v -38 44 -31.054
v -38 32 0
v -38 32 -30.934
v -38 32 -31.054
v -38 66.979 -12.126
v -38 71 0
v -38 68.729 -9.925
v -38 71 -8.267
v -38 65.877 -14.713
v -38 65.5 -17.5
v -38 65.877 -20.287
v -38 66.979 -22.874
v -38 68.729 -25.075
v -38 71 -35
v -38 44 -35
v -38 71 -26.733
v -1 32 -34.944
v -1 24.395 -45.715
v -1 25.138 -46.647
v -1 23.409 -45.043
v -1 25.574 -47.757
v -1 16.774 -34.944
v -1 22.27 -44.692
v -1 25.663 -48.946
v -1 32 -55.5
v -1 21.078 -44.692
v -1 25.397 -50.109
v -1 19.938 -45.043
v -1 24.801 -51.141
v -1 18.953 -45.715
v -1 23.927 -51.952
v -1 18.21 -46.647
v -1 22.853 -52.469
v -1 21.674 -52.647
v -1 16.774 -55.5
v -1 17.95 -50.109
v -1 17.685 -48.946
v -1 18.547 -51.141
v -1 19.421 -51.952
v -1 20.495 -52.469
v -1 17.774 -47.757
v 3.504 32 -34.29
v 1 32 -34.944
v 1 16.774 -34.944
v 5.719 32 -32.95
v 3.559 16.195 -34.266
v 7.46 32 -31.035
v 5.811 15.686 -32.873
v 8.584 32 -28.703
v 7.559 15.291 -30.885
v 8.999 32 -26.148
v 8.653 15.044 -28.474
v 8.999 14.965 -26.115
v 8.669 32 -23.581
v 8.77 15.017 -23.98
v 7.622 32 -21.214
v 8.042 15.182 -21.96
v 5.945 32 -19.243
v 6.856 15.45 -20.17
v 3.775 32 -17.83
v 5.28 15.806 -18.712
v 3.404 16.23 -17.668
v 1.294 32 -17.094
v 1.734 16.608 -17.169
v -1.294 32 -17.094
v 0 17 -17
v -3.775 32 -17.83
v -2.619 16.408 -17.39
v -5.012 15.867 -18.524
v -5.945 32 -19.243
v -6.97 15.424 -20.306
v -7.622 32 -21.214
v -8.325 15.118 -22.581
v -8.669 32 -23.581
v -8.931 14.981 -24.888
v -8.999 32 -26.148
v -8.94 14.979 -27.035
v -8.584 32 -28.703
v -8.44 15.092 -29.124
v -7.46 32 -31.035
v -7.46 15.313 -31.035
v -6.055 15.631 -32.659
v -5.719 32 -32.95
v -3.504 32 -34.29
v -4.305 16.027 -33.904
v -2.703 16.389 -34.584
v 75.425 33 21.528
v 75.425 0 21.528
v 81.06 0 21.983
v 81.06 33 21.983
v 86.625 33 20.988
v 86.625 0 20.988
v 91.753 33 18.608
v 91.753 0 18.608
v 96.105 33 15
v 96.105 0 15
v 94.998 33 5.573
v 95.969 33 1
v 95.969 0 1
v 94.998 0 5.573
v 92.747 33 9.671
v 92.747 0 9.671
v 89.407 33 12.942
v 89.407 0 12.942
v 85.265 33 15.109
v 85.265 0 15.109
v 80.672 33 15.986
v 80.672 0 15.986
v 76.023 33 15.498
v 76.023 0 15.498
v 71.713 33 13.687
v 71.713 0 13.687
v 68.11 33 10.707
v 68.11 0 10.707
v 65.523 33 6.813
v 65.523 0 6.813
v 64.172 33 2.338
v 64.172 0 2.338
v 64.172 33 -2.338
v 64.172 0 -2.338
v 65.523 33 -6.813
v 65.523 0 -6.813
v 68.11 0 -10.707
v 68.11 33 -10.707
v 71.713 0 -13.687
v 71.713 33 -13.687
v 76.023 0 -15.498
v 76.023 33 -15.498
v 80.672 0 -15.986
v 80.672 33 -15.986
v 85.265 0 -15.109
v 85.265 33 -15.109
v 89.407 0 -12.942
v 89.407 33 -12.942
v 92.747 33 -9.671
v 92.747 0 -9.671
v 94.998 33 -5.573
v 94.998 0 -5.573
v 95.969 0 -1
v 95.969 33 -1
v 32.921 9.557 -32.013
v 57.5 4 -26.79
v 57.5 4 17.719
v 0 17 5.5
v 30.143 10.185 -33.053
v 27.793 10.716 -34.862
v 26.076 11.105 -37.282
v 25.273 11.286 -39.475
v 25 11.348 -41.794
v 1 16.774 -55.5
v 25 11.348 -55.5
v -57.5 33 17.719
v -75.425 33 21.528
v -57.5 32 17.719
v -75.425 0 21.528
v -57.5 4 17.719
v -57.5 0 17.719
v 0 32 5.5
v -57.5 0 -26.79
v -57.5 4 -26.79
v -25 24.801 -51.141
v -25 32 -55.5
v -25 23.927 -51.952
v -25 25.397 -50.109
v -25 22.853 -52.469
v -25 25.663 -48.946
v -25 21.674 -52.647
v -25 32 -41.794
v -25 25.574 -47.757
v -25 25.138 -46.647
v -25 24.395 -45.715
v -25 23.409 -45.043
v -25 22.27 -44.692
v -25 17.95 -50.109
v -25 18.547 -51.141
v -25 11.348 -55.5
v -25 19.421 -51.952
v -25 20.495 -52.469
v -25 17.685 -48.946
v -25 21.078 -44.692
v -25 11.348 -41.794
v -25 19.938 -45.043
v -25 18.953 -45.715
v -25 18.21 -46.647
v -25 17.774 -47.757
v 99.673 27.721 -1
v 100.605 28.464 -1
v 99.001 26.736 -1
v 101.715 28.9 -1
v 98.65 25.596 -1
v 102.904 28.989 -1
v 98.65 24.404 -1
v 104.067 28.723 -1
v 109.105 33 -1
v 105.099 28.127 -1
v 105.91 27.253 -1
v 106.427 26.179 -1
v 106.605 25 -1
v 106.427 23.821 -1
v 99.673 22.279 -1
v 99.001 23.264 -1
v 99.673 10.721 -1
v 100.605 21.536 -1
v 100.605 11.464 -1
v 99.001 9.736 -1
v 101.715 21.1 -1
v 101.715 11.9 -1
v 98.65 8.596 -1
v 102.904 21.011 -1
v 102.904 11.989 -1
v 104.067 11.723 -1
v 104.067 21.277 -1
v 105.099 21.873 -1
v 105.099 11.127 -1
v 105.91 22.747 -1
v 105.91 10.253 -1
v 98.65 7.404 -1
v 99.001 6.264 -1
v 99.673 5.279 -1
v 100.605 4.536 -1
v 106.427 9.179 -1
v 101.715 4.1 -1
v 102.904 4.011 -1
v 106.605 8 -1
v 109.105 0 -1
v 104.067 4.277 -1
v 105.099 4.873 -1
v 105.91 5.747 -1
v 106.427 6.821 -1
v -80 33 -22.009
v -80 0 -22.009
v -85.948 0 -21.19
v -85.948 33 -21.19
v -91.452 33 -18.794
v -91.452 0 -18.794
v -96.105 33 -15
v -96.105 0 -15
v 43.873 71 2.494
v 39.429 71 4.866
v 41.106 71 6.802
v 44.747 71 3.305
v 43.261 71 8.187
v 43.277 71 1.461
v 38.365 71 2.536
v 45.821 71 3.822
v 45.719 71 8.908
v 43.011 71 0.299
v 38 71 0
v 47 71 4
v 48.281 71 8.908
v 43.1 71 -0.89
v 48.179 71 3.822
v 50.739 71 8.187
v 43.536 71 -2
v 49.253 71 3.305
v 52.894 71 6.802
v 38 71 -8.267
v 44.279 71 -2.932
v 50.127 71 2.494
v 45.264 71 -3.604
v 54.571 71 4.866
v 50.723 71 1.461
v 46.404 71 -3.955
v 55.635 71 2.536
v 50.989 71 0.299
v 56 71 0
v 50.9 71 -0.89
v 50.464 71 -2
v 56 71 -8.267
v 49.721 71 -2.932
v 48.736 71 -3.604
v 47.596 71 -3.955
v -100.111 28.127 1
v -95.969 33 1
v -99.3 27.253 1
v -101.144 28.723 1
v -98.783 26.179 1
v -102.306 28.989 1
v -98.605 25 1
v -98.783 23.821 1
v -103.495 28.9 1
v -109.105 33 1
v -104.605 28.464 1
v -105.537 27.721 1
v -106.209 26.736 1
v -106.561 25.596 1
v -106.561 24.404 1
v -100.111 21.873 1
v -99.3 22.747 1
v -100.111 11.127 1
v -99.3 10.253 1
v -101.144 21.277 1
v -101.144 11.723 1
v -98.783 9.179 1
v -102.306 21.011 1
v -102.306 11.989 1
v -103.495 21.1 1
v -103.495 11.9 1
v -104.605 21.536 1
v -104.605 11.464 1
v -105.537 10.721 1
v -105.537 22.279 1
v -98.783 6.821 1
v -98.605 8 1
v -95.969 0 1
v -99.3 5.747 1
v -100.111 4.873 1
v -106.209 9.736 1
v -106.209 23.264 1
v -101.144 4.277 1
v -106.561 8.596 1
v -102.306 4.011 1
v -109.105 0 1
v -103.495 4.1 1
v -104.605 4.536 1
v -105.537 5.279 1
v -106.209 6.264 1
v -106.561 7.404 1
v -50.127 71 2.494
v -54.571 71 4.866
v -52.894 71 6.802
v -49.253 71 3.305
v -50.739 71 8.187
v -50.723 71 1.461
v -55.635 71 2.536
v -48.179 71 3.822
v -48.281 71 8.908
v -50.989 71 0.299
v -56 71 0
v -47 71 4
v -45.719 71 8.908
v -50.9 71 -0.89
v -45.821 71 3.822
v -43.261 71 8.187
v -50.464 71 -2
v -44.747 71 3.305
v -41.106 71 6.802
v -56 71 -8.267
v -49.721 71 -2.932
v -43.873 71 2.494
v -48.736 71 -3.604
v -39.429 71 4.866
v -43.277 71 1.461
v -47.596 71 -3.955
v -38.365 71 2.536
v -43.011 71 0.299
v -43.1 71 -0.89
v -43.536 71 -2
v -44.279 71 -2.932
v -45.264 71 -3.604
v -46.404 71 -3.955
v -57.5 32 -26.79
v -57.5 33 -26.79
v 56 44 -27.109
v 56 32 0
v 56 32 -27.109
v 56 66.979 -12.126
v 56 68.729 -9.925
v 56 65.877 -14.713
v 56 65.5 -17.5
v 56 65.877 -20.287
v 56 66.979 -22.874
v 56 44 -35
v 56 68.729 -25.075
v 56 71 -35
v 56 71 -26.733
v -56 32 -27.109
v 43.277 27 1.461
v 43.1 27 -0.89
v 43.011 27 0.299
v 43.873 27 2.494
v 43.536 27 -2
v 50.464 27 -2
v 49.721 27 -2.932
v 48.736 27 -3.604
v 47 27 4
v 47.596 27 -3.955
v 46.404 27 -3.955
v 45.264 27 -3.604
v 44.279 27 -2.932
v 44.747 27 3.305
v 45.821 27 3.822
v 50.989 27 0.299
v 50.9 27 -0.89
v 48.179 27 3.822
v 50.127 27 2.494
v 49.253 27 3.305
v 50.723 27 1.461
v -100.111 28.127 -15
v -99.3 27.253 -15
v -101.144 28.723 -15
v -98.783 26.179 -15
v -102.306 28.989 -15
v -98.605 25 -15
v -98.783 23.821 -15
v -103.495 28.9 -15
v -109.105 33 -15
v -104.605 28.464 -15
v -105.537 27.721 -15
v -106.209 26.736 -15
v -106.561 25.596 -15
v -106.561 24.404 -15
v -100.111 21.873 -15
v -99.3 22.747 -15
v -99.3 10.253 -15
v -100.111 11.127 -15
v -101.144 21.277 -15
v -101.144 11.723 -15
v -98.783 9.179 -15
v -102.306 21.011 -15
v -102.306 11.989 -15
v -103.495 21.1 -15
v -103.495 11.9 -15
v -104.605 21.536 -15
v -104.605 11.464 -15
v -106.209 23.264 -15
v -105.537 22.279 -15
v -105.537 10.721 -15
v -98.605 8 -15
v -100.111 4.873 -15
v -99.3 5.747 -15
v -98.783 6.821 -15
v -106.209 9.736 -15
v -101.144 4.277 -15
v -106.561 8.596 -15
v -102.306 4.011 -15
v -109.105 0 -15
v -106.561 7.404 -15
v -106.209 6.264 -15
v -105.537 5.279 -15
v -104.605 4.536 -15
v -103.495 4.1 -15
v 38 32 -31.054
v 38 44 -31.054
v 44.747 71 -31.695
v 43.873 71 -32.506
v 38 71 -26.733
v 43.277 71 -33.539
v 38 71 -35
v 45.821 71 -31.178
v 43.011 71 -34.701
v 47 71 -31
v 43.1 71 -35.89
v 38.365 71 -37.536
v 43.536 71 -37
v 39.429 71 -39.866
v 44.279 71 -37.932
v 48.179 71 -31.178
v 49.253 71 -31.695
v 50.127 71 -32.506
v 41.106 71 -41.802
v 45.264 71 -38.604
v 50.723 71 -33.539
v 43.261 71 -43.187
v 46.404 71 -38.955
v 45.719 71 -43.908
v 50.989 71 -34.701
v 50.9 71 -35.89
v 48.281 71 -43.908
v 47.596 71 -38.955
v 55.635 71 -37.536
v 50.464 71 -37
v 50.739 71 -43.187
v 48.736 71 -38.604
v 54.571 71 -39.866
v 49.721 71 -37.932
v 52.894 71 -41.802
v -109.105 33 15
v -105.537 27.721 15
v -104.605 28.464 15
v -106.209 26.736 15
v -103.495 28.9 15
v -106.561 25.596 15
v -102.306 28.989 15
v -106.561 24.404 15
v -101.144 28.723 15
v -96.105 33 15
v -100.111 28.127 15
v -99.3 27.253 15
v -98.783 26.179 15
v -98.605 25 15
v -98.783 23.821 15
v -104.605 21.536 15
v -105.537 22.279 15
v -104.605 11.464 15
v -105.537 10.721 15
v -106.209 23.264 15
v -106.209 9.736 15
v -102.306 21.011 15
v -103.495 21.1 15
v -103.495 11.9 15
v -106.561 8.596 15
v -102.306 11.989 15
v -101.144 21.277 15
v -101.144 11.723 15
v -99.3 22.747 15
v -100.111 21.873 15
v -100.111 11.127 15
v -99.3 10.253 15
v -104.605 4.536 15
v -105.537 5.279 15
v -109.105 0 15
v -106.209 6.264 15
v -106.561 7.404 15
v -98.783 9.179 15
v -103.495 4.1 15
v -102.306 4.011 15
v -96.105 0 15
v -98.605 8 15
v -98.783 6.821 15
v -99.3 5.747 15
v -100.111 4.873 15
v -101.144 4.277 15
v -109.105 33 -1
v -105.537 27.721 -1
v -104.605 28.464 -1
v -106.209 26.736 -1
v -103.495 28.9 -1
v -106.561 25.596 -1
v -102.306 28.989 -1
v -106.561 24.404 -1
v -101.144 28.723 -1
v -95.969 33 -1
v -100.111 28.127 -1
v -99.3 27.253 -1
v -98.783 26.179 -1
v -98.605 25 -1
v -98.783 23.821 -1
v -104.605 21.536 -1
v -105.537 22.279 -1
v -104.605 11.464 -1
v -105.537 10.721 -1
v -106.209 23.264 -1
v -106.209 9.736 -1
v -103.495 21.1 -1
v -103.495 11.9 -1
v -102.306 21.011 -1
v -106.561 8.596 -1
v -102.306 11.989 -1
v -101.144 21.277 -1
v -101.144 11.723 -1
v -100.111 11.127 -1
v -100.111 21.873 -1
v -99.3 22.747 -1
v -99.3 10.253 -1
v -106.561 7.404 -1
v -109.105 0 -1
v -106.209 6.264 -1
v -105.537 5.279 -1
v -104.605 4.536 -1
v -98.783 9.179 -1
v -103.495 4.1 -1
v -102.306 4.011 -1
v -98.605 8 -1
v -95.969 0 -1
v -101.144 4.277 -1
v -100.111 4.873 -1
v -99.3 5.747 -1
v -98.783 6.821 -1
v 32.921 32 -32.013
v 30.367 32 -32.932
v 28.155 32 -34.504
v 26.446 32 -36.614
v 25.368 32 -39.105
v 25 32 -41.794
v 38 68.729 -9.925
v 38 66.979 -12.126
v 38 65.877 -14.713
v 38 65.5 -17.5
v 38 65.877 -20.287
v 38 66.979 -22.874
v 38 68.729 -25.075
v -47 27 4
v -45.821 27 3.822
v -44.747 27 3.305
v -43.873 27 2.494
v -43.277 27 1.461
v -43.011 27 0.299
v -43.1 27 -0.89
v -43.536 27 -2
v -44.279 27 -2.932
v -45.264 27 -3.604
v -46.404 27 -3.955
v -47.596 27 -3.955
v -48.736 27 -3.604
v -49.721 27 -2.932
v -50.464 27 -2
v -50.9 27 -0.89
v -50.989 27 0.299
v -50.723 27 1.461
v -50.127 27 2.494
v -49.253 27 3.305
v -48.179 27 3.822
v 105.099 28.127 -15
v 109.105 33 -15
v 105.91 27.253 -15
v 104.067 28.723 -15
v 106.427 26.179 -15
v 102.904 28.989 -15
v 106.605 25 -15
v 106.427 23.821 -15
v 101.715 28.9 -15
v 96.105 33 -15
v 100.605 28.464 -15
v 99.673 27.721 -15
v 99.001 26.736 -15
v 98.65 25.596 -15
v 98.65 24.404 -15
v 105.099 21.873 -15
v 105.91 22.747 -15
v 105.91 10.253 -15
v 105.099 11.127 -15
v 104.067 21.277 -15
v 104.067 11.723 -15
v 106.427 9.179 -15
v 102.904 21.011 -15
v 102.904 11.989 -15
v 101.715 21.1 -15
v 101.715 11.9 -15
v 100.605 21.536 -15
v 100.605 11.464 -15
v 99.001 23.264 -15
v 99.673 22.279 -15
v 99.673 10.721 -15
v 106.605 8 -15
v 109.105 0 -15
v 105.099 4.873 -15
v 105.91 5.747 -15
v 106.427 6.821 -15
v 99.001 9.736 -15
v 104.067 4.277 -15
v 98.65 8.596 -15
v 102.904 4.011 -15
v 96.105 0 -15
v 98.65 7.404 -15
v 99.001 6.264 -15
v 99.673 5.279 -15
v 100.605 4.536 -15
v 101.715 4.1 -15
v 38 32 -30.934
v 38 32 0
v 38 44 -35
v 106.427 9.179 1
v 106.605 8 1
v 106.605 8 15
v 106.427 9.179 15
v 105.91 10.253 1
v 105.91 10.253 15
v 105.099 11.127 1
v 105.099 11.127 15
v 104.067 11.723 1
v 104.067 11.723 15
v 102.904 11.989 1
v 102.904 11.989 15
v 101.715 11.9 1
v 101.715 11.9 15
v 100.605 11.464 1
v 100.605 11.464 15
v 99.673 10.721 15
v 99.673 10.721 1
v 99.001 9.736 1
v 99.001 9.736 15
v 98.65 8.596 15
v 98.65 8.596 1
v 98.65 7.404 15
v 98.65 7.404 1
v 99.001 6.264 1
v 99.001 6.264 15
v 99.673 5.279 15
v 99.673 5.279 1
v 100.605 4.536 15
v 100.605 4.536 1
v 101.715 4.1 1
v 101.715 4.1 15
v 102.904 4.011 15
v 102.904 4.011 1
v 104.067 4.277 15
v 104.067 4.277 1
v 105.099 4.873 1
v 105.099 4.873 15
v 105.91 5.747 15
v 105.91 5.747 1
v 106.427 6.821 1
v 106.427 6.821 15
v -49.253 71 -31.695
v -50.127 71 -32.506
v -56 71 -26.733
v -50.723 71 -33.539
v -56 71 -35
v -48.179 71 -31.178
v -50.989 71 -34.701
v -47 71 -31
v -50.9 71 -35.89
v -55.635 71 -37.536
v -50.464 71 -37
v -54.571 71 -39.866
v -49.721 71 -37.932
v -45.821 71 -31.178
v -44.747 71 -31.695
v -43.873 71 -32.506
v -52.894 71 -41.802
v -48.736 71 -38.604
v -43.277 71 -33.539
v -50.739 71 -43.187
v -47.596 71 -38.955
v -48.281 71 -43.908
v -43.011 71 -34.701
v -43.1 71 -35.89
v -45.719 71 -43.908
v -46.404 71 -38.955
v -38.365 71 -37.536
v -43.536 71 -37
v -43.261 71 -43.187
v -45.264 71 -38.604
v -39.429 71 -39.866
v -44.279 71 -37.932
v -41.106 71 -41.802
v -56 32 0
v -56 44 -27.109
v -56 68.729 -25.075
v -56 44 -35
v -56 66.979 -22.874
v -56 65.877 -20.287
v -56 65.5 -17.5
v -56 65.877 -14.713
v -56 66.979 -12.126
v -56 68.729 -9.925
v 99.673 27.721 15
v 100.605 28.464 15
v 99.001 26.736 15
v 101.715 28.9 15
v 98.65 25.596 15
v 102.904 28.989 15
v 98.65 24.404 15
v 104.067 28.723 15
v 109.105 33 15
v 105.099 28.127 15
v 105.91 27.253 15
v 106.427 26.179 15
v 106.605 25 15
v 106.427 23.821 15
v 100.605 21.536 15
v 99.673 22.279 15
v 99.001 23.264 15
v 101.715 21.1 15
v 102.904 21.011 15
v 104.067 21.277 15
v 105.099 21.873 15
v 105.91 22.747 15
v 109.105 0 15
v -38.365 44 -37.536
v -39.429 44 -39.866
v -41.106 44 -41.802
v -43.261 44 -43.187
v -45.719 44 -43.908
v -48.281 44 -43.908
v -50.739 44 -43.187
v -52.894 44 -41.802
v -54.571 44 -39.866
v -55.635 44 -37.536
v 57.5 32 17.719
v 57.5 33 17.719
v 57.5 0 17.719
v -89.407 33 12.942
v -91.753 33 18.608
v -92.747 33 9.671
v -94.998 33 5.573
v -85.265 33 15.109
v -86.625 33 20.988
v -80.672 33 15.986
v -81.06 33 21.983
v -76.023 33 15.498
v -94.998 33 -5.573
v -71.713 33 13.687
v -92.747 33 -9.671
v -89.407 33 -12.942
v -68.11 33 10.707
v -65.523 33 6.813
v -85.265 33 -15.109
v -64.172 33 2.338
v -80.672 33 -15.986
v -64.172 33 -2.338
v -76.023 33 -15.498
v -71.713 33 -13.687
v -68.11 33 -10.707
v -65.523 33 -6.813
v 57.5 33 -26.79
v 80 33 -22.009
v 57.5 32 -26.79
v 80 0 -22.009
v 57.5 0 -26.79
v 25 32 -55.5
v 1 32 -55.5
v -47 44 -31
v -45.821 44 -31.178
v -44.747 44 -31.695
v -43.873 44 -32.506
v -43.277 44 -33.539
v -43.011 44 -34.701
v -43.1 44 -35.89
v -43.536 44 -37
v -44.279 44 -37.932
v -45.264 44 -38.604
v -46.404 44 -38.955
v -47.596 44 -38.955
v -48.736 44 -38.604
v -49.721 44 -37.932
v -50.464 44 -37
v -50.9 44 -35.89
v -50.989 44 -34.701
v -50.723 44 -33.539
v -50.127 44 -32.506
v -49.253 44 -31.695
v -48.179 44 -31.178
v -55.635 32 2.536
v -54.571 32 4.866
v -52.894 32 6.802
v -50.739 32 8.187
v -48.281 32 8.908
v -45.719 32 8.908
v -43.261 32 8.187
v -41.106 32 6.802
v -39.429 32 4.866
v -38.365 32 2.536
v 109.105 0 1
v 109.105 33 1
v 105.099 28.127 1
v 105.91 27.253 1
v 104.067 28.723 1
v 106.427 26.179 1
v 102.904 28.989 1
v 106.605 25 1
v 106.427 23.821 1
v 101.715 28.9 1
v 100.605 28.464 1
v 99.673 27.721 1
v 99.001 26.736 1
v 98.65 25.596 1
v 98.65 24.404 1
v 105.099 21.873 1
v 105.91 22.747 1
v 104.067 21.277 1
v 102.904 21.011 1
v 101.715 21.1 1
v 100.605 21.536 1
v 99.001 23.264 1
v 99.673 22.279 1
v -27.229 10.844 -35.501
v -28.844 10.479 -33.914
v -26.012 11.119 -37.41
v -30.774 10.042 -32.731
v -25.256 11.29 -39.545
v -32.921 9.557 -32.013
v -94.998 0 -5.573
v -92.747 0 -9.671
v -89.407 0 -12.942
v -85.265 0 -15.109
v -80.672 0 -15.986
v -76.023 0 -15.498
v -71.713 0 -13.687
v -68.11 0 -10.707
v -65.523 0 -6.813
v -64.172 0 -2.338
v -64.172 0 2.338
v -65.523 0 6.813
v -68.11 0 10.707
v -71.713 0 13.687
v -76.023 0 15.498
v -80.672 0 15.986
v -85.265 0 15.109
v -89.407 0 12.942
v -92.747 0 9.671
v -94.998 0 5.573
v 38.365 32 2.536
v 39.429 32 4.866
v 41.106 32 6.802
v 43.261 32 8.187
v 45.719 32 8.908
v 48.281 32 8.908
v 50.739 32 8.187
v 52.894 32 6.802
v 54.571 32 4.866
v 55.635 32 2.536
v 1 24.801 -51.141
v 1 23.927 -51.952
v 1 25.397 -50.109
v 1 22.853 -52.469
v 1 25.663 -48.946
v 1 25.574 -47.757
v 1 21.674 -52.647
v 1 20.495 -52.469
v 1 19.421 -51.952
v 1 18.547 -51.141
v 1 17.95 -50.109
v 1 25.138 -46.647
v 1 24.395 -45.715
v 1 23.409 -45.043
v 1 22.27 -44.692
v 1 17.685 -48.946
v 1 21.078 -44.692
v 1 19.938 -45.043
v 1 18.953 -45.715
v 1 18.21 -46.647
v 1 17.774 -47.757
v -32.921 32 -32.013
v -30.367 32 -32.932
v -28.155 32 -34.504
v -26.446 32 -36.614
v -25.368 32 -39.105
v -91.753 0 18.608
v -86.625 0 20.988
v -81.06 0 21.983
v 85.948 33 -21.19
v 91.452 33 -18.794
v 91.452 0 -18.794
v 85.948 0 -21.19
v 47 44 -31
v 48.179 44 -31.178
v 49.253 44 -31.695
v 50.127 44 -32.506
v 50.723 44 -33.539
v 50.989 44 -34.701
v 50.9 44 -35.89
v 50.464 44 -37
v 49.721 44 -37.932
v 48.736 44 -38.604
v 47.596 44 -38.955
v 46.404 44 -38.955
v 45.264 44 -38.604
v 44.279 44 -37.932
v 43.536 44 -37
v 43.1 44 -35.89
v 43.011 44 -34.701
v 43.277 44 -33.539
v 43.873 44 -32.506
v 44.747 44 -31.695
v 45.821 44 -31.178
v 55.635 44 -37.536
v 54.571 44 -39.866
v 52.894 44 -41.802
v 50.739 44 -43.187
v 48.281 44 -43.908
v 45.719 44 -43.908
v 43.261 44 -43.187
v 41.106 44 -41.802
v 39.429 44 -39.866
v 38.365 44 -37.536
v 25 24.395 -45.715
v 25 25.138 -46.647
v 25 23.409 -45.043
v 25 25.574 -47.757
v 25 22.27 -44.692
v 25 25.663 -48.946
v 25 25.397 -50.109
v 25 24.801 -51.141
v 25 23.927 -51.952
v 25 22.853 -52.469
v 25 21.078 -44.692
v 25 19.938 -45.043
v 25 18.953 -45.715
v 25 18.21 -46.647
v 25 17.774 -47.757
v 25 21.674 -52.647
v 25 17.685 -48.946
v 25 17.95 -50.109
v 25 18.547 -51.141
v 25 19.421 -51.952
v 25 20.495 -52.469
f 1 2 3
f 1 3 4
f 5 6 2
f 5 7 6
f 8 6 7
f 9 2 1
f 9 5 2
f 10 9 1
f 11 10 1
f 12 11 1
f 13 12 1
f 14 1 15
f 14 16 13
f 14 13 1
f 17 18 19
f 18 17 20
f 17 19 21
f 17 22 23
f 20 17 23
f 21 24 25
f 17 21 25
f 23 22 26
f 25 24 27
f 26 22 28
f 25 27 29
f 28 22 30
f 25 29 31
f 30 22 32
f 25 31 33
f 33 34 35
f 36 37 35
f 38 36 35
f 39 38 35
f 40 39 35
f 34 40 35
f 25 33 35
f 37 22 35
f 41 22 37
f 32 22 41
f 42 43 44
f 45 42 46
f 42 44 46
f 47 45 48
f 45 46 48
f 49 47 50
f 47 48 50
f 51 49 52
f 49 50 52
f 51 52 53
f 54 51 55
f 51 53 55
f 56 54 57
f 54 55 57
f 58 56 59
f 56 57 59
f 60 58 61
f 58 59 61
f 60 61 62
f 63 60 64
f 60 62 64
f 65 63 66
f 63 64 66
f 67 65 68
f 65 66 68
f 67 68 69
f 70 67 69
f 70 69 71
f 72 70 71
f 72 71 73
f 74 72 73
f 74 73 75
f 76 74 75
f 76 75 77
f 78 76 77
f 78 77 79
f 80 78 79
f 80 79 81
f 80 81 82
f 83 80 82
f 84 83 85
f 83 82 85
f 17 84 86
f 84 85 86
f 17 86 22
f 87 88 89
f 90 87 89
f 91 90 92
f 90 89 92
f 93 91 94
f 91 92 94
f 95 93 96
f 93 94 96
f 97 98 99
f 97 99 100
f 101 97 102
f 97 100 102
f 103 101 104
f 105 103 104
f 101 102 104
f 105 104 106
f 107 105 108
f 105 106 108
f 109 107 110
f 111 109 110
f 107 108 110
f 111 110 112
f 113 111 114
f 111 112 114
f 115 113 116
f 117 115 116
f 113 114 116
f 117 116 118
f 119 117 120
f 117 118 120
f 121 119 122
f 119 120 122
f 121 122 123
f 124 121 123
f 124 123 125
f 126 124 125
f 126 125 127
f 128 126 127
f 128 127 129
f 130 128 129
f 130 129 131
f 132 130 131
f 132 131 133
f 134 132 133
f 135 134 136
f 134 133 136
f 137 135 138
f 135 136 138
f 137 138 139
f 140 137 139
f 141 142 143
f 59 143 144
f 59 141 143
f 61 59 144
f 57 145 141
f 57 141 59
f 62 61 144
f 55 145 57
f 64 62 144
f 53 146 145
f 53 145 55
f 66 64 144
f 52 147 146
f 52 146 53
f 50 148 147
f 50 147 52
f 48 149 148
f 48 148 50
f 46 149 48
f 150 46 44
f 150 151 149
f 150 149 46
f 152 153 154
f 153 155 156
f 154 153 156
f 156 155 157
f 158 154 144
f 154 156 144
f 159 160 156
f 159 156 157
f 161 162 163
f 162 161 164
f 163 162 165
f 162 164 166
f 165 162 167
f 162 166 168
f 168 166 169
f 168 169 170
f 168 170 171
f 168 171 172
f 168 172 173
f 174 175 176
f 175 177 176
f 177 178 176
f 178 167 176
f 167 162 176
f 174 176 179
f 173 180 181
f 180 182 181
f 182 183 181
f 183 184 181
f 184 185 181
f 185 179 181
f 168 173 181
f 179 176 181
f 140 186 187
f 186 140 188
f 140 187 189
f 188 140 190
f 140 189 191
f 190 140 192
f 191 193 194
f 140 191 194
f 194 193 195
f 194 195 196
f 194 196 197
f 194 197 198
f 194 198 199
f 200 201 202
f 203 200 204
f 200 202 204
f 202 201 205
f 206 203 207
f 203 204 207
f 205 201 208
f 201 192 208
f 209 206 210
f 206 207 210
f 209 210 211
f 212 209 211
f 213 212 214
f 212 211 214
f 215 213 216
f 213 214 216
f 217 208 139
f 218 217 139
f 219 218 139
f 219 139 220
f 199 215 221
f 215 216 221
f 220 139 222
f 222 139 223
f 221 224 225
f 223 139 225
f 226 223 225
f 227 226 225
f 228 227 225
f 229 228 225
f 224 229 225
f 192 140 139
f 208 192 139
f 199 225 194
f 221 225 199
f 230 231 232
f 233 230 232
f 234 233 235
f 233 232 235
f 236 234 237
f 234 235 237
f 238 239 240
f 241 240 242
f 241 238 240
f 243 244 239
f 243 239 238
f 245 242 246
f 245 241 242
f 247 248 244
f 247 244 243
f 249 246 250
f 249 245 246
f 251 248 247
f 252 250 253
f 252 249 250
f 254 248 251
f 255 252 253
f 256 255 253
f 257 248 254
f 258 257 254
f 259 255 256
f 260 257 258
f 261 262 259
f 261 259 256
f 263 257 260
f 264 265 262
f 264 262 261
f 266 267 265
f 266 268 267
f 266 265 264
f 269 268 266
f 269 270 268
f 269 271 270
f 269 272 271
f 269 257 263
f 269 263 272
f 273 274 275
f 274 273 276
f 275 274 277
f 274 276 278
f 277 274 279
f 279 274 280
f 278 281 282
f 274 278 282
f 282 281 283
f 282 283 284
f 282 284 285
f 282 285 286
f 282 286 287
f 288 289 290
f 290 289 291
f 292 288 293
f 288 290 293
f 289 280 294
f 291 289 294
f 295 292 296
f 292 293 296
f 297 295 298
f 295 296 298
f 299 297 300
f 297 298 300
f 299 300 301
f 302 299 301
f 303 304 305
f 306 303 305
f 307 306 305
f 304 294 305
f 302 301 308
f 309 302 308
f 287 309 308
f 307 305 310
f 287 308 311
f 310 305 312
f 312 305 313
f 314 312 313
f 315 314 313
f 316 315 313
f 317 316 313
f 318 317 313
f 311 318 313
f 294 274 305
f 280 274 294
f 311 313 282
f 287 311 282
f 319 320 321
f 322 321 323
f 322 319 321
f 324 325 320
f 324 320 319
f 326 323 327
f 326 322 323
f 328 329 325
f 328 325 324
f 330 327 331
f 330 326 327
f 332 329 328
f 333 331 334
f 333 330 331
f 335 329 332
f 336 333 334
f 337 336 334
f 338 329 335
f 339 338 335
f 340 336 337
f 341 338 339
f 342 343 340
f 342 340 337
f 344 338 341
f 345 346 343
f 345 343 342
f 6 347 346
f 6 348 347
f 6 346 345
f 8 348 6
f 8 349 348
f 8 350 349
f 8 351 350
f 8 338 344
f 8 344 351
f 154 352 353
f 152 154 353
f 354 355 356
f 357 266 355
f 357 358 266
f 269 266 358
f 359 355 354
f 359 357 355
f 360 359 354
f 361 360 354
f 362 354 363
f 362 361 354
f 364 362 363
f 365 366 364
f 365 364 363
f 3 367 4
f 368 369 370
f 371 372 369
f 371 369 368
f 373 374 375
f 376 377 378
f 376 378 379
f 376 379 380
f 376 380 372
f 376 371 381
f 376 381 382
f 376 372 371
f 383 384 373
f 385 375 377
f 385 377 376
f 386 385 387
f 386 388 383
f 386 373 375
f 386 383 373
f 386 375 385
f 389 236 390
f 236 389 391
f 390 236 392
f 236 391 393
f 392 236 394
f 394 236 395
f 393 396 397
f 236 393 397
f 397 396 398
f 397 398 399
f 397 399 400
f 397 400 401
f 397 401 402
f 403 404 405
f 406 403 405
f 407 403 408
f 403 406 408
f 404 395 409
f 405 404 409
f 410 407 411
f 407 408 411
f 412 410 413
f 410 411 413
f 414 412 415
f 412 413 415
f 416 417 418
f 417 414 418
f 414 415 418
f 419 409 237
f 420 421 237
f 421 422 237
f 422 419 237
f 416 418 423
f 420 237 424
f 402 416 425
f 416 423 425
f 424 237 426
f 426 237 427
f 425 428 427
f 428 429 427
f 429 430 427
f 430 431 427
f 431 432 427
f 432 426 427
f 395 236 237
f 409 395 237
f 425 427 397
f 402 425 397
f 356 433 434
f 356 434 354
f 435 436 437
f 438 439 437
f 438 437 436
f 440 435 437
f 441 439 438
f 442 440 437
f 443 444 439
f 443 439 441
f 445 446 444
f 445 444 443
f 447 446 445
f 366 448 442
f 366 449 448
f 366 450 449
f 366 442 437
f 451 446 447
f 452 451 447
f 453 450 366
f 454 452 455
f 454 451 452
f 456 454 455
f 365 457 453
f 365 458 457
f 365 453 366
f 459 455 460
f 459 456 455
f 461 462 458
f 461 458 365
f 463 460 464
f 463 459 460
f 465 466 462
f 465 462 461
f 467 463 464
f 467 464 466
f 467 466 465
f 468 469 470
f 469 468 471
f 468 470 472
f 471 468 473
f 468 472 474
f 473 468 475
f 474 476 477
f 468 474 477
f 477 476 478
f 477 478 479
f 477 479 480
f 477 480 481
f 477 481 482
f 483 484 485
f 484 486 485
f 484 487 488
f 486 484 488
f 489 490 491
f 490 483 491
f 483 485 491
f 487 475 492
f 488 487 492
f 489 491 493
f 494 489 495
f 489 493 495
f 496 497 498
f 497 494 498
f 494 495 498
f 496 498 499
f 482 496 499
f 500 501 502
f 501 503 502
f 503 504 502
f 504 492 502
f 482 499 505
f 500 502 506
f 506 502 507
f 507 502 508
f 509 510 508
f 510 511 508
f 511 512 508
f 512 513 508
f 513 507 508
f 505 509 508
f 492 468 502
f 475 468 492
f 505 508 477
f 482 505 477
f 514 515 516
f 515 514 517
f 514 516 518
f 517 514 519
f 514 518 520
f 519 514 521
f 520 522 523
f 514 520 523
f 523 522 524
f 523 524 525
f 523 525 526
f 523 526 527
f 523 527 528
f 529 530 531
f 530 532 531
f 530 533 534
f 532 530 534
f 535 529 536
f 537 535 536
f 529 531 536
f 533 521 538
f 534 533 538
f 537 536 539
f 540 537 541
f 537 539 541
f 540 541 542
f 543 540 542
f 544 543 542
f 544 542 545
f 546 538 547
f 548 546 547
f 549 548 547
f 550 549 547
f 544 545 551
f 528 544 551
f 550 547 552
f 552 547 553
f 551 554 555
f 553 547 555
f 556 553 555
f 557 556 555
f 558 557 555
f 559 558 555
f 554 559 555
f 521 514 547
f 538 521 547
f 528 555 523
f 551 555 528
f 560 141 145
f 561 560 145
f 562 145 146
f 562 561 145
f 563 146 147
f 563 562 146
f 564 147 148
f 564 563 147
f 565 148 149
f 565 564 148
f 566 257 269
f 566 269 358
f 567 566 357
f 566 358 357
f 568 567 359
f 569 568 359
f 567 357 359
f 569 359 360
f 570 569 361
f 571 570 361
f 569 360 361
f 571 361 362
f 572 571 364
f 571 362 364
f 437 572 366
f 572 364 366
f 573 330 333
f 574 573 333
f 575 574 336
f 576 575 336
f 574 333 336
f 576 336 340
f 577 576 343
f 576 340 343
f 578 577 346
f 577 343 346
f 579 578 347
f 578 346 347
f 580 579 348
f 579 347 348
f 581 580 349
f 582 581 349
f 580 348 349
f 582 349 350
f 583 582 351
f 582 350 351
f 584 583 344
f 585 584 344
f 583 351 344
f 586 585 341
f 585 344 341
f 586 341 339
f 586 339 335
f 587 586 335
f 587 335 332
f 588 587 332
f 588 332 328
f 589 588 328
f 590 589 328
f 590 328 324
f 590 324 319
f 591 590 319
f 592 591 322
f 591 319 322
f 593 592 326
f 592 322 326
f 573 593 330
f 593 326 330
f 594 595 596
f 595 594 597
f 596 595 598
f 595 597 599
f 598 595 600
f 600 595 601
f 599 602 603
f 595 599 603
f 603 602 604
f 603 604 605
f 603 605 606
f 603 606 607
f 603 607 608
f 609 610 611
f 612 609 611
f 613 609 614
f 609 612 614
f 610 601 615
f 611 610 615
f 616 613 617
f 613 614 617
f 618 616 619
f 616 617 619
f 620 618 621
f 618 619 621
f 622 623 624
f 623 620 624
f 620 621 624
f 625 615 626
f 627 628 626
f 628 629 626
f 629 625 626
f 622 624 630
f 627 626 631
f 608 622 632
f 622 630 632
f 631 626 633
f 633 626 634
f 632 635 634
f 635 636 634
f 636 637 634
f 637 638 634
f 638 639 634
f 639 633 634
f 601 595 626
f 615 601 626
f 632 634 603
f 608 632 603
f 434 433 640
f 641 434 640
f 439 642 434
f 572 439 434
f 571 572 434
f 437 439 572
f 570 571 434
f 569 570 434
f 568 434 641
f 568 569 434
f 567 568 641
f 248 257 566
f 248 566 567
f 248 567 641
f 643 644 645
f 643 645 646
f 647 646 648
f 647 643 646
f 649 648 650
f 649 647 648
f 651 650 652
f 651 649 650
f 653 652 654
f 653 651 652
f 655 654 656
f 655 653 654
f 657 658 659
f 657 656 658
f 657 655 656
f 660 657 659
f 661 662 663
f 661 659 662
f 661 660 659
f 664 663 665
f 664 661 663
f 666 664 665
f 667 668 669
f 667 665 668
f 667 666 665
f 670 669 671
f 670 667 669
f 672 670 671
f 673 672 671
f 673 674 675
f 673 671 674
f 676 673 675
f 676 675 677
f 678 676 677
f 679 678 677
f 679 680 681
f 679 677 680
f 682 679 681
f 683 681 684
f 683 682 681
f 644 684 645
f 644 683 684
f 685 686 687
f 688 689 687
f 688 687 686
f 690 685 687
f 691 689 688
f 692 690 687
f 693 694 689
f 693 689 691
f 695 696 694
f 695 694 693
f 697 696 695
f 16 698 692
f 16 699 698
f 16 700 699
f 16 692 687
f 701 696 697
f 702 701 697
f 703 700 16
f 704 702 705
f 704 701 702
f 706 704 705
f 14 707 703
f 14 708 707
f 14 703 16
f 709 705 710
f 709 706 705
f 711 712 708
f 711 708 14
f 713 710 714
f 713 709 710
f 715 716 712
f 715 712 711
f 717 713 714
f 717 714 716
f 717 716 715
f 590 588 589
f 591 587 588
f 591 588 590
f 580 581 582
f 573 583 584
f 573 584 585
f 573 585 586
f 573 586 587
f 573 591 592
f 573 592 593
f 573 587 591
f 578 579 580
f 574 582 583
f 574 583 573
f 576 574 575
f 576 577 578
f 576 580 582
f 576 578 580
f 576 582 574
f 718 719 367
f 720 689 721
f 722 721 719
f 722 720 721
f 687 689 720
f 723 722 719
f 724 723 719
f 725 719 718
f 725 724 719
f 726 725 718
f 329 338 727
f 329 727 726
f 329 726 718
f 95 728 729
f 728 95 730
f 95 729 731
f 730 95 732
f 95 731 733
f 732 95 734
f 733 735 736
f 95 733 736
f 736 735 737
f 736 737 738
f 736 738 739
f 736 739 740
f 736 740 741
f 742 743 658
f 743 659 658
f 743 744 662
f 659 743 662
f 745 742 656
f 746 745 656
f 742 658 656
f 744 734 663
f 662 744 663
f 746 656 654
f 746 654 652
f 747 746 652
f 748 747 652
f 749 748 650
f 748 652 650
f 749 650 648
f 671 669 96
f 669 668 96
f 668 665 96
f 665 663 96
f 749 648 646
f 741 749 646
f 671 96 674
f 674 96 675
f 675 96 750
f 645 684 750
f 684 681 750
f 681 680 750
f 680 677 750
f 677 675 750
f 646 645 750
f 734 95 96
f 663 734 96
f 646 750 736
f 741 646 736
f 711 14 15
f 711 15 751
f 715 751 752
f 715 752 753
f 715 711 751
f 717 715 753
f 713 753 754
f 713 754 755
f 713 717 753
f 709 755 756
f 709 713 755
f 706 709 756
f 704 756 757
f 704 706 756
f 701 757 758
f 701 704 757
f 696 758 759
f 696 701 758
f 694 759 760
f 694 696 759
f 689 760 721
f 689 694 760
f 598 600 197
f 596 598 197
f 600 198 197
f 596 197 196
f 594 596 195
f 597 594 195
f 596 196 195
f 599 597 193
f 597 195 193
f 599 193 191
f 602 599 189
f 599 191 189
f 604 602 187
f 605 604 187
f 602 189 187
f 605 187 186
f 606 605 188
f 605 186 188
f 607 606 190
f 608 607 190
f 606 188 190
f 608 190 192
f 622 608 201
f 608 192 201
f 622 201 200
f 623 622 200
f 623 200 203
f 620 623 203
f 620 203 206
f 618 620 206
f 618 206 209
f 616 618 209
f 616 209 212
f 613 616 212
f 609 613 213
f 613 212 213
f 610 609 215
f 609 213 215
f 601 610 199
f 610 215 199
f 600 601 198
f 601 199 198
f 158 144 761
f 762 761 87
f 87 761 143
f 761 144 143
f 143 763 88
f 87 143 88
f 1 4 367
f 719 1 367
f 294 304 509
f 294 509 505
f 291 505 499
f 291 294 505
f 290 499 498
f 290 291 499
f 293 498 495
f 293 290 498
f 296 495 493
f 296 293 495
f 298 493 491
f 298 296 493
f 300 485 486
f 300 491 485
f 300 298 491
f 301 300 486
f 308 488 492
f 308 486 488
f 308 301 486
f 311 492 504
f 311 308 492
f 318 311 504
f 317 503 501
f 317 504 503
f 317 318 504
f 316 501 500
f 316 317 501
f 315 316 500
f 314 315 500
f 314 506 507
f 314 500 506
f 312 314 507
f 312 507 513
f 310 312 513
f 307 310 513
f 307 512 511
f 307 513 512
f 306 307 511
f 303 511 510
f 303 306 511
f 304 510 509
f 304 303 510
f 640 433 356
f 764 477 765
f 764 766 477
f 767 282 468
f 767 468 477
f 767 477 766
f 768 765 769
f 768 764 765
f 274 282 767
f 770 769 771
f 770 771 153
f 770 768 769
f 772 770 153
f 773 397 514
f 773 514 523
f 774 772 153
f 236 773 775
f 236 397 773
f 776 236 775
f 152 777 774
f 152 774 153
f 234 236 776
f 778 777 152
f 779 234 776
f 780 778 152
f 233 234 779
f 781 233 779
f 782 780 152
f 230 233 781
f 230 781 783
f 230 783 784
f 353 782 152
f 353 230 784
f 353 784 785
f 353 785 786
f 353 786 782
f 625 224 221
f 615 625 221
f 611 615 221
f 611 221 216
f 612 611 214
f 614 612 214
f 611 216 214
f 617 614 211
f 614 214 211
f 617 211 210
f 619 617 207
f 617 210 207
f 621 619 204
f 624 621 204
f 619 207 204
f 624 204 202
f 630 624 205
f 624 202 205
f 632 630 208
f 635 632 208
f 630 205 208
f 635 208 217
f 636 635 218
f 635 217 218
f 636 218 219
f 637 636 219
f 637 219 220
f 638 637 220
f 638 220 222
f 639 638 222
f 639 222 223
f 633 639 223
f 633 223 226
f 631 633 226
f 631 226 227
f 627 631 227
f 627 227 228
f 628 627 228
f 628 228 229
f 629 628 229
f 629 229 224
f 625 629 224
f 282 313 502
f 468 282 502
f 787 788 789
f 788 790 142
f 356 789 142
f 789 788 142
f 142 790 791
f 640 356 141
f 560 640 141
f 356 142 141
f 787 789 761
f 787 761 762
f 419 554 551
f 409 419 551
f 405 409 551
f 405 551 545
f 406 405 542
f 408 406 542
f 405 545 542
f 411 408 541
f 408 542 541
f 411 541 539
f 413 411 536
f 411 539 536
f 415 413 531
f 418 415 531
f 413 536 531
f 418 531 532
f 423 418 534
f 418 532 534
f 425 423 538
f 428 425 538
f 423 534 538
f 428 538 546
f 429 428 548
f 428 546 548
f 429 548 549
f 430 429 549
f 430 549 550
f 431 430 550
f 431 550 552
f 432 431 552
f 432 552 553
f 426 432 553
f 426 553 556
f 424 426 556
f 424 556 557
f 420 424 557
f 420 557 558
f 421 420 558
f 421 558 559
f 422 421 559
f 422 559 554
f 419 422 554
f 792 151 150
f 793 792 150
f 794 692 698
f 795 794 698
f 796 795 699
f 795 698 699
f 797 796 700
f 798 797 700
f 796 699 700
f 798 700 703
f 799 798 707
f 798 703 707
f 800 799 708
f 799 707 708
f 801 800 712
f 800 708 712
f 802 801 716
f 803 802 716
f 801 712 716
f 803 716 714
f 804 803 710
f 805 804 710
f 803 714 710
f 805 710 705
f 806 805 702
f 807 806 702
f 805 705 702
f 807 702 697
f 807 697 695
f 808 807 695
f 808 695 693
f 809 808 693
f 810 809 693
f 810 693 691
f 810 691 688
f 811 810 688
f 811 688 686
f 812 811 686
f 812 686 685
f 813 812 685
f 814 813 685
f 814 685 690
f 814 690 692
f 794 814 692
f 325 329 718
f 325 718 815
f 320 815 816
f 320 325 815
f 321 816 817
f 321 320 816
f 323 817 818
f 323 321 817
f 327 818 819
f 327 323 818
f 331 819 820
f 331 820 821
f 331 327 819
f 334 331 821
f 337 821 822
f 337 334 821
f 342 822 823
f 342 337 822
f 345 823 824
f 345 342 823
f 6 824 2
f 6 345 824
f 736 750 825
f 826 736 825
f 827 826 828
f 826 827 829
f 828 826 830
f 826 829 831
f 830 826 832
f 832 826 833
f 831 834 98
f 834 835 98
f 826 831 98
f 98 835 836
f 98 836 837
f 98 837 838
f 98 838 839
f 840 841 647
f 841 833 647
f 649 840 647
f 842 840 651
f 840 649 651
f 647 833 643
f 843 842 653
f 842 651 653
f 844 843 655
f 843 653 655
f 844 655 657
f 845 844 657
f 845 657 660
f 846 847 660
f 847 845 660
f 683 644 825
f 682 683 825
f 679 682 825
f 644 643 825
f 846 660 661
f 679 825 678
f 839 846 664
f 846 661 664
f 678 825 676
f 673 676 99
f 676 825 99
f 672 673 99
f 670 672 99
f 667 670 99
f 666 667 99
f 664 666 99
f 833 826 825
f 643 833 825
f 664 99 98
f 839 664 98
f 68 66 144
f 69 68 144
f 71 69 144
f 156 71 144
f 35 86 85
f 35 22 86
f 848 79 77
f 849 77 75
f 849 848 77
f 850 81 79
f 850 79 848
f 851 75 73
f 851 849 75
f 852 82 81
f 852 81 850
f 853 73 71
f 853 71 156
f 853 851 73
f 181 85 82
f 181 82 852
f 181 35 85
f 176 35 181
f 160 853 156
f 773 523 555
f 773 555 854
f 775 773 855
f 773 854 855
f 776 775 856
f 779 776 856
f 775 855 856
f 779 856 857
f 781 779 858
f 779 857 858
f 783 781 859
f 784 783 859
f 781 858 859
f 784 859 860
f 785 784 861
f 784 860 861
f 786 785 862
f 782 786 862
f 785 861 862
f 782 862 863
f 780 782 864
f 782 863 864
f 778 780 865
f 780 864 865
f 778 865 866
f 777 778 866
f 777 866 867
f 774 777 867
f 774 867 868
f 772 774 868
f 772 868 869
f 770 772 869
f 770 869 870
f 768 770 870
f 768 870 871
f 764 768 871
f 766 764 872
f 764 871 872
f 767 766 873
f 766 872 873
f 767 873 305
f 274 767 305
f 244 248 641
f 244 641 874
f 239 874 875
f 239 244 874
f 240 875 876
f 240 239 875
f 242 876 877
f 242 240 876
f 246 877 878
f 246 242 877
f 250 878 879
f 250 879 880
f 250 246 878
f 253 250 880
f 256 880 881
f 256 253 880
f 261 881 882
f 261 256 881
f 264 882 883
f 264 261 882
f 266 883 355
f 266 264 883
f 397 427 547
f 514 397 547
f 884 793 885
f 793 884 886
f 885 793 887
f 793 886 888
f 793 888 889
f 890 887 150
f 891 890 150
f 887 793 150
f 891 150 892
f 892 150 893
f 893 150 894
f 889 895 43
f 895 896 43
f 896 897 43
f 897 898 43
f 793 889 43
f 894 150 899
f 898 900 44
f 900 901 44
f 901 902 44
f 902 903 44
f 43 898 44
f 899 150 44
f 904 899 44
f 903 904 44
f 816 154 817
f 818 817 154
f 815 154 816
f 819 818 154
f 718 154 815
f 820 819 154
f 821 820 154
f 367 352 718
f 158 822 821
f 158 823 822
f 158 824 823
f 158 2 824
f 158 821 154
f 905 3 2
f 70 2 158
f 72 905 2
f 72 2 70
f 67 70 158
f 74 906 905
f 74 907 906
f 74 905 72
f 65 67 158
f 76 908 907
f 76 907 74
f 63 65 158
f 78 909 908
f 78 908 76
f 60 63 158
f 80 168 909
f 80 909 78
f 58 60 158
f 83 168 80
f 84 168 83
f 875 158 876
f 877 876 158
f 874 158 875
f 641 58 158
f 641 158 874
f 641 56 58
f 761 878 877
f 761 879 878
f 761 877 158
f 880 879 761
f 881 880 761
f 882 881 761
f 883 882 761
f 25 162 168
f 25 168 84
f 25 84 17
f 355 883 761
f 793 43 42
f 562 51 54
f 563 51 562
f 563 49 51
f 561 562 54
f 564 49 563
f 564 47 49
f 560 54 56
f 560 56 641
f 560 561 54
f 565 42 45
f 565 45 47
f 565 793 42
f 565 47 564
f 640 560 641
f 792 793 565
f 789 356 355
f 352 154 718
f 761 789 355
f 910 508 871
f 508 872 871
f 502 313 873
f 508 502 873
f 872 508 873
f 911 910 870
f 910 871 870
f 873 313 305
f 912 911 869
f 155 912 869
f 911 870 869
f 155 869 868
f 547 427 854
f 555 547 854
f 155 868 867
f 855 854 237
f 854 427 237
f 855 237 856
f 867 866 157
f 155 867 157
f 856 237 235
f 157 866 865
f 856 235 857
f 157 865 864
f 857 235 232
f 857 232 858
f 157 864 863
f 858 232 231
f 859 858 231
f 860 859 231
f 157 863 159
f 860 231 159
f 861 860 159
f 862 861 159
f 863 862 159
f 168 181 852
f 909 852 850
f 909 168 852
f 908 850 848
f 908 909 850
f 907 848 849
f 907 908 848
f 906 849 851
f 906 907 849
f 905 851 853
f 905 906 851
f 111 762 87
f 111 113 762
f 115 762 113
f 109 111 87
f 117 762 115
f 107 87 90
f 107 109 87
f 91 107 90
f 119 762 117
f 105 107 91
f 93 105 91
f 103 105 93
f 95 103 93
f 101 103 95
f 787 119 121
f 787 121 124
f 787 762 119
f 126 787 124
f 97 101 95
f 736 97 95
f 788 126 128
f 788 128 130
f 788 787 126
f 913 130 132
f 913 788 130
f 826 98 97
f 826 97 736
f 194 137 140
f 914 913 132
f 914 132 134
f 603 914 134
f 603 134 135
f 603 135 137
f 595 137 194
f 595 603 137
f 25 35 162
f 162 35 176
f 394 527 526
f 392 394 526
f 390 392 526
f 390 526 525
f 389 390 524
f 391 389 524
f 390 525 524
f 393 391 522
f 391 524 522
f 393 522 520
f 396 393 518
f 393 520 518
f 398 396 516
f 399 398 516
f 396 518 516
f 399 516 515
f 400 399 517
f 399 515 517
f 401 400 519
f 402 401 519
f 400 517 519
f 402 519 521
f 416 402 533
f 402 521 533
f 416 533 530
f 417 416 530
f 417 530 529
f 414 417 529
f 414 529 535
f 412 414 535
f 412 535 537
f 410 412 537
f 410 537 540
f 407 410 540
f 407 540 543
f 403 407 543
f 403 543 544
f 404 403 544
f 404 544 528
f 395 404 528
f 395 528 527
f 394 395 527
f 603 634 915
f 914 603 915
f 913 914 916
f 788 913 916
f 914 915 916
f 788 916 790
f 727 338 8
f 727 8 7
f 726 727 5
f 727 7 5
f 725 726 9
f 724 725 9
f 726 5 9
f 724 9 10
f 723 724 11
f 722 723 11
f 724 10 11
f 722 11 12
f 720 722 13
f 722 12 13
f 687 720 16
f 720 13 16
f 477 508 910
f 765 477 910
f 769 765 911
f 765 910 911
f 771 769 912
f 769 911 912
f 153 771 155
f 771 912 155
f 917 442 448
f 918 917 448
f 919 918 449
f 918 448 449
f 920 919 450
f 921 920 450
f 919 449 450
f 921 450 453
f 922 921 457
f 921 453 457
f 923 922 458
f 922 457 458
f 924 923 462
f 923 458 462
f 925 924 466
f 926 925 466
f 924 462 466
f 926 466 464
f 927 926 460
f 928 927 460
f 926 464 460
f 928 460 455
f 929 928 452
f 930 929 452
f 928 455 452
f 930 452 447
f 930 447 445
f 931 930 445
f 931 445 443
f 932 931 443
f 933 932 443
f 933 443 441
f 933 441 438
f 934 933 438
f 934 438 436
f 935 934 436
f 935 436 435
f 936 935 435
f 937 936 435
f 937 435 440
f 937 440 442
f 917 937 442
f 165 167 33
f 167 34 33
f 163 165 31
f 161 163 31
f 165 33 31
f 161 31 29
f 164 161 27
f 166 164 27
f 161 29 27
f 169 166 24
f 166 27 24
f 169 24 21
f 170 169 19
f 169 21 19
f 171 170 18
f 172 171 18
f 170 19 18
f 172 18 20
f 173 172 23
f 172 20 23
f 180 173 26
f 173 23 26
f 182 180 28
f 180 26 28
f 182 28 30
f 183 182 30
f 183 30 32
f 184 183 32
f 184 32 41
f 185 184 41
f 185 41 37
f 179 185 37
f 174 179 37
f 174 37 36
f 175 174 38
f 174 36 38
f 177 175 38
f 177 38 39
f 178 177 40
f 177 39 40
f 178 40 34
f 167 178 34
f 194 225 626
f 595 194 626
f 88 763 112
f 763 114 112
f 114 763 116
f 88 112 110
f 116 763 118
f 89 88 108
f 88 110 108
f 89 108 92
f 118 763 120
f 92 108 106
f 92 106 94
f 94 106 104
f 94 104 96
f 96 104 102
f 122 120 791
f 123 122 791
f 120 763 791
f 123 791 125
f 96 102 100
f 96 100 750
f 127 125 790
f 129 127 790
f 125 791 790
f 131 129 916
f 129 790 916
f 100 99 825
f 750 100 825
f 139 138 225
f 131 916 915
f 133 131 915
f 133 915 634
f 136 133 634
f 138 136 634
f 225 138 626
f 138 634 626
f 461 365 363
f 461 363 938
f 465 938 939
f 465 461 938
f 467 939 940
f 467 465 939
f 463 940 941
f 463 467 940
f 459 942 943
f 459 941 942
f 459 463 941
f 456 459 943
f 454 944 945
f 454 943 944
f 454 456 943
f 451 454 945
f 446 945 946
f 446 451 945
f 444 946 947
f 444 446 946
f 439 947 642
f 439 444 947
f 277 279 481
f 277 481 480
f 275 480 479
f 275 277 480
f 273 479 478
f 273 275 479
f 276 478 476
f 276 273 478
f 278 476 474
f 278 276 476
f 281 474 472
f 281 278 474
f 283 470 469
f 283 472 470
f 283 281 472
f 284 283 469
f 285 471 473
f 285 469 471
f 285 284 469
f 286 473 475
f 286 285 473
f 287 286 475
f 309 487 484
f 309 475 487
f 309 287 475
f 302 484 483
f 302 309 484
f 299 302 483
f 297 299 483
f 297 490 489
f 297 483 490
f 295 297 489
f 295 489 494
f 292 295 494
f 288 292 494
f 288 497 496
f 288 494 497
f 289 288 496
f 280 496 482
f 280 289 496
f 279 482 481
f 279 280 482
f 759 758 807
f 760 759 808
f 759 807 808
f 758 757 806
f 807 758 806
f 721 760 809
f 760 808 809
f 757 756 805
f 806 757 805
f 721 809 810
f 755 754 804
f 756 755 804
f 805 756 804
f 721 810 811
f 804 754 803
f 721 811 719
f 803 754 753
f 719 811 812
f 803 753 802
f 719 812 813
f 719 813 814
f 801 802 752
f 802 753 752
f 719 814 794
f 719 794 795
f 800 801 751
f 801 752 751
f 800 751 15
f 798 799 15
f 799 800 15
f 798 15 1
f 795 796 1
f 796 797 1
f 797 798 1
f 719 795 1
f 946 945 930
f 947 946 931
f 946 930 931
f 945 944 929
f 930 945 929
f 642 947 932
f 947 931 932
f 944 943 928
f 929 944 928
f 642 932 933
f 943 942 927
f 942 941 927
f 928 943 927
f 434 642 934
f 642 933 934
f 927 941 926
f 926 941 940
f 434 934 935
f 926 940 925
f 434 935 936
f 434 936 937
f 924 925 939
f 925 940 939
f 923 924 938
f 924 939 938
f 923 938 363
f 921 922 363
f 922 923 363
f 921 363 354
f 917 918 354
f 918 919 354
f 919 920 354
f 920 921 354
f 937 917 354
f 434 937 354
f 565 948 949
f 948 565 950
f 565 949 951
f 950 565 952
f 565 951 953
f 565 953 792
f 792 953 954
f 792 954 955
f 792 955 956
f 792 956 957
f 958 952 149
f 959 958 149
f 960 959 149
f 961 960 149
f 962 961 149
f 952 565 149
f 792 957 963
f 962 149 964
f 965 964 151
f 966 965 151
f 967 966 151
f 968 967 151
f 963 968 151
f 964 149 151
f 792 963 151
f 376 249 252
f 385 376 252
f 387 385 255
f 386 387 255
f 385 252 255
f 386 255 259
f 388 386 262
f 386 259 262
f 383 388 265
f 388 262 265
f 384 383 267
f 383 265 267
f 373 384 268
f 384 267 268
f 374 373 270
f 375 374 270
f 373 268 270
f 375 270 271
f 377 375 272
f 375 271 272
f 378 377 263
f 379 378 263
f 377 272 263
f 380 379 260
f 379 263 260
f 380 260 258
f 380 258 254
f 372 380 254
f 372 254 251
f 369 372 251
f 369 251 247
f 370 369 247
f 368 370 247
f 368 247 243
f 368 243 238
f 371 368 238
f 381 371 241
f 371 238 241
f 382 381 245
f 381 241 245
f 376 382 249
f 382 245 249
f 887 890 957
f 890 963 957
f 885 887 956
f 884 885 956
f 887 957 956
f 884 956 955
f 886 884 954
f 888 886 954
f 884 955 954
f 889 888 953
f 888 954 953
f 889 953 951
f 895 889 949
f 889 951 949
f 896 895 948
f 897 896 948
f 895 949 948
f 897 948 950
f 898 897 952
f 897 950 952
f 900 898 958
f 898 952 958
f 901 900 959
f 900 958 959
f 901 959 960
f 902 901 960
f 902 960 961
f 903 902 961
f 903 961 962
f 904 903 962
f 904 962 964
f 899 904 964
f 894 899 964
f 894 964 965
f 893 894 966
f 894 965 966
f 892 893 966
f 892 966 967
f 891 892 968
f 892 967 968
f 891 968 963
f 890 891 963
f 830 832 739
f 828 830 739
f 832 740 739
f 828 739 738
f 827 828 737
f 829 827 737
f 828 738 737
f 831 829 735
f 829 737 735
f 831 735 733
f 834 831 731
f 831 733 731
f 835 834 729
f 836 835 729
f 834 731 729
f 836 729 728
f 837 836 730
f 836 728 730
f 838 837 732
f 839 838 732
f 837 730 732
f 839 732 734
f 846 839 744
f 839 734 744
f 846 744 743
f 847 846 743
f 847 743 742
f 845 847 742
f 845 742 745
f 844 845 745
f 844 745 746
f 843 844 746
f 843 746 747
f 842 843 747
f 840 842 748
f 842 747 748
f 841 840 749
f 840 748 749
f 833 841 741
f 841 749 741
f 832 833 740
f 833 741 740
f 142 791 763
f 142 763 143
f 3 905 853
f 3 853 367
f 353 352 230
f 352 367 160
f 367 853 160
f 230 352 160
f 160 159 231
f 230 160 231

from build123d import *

# Parameters (mm, degrees)
BOSS_EXTRUDE1_DEPTH     = 33
FILLET2_R               = 10
FILLET3_R               = 10
CUT_EXTRUDE1_DEPTH      = 127.78010009
CUT_EXTRUDE1_DEPTH_BACK = 127.78010009
SKETCH3_W               = 115
SKETCH3_H               = 4.910725557
BOSS_EXTRUDE3_DEPTH     = 39
CUT_EXTRUDE5_DEPTH      = 65.5
CUT_EXTRUDE6_DEPTH      = 44
SKETCH9_R               = 4
CUT_EXTRUDE7_DEPTH      = 44
SKETCH10_R              = 4
CUT_EXTRUDE8_DEPTH      = 22
SKETCH11_R              = 4
CUT_EXTRUDE9_DEPTH      = 31
SKETCH12_R              = 10.5
CUT_EXTRUDE10_DEPTH     = 106.5


with BuildPart() as part:
    # Sketch1 → Boss-Extrude1 (new body)
    with BuildSketch(Plane(origin=(0, 0, 0), x_dir=(1, 0, 0), z_dir=(0, 1, 0))):
        with BuildLine():
            Line((-25, 55.5), (-25, 33.696074146))
            Line((-25, 33.696074146), (-80, 22.008574146))
            ThreePointArc((-80, 22.008574146), (-88.782047704, 20.180509757), (-96.105195929, 15))
            Line((-96.105195929, 15), (-109.105195929, 15))
            Line((-109.105195929, 15), (-109.105195929, 1))
            Line((-109.105195929, 1), (-95.968719423, 1))
            ThreePointArc((-95.968719423, 1), (-64, 0), (-95.968719423, -1))
            Line((-95.968719423, -1), (-109.105195929, -1))
            Line((-109.105195929, -1), (-109.105195929, -15))
            Line((-109.105195929, -15), (-96.105195929, -15))
            ThreePointArc((-96.105195929, -15), (-86.625068957, -20.987753506), (-75.425325161, -21.527881597))
            Line((-75.425325161, -21.527881597), (0, -5.5))
            Line((0, -5.5), (75.425325161, -21.527881597))
            ThreePointArc((75.425325161, -21.527881597), (86.625068957, -20.987753506), (96.105195929, -15))
            Line((96.105195929, -15), (109.105195929, -15))
            Line((109.105195929, -15), (109.105195929, -1))
            Line((109.105195929, -1), (95.968719423, -1))
            ThreePointArc((95.968719423, -1), (64, 0), (95.968719423, 1))
            Line((95.968719423, 1), (109.105195929, 1))
            Line((109.105195929, 1), (109.105195929, 15))
            Line((109.105195929, 15), (96.105195929, 15))
            ThreePointArc((96.105195929, 15), (88.782047704, 20.180509757), (80, 22.008574146))
            Line((80, 22.008574146), (25, 33.696074146))
            Line((25, 33.696074146), (25, 55.5))
            Line((25, 55.5), (1, 55.5))
            Line((1, 55.5), (1, 34.94427191))
            ThreePointArc((1, 34.94427191), (0, 17), (-1, 34.94427191))
            Line((-1, 34.94427191), (-1, 55.5))
            Line((-1, 55.5), (-25, 55.5))
        make_face()
    extrude(amount=BOSS_EXTRUDE1_DEPTH)

    # Fillet2
    fillet2_edges = [part.edges().sort_by_distance(p)[0] for p in [
        (25, 16.5, -33.696074146),
    ]]
    fillet(fillet2_edges, radius=FILLET2_R)

    # Fillet3
    fillet3_edges = [part.edges().sort_by_distance(p)[0] for p in [
        (-25, 16.5, -33.696074146),
    ]]
    fillet(fillet3_edges, radius=FILLET3_R)

    # Sketch3 → Cut-Extrude1 (cut, two sides: drawn at the far end of the back side and taken through both)
    with BuildSketch(Plane.XY.offset(-CUT_EXTRUDE1_DEPTH_BACK)):
        with Locations((0, 34.455362779)):
            Rectangle(SKETCH3_W, SKETCH3_H)
        Polygon((-57.5, 4), (-57.5, -3.298292375), (57.5, -3.298292375), (57.5, 4), (0, 17), align=None)
    extrude(amount=CUT_EXTRUDE1_DEPTH + CUT_EXTRUDE1_DEPTH_BACK, mode=Mode.SUBTRACT)

    # Sketch5 → Boss-Extrude3 (add)
    with BuildSketch(Plane(origin=(0, 71, 0), x_dir=(1, 0, 0), z_dir=(0, 1, 0))):
        with BuildLine():
            Line((-38, 0), (-38, 35))
            ThreePointArc((-38, 35), (-47, 44), (-56, 35))
            Line((-56, 35), (-56, 0))
            ThreePointArc((-56, 0), (-47, -9), (-38, 0))
        make_face()
        with BuildLine():
            Line((56, 0), (56, 35))
            ThreePointArc((56, 35), (47, 44), (38, 35))
            Line((38, 35), (38, 0))
            ThreePointArc((38, 0), (47, -9), (56, 0))
        make_face()
    extrude(amount=-BOSS_EXTRUDE3_DEPTH)

    # Sketch6 → Cut-Extrude5 (cut, symmetric)
    with BuildSketch(Plane(origin=(0, 0, 0), x_dir=(0, 0, -1), z_dir=(1, 0, 0))):
        Polygon((44, 71), (44, 44), (31.054287073, 44), (31.054287073, 32), (44, 32), (62.918124126, 32), (62.918124126, 71), align=None)
    extrude(amount=CUT_EXTRUDE5_DEPTH, both=True, mode=Mode.SUBTRACT)

    # Sketch7 → Cut-Extrude6 (cut)
    with BuildSketch(Plane(origin=(0, 0, 0), x_dir=(1, 0, 0), z_dir=(0, 1, 0))):
        Polygon((-56, 31.054287073), (-38, 31.054287073), (-56, 27.108574146), align=None)
        Polygon((56, 27.108574146), (56, 31.054287073), (38, 31.054287073), align=None)
    extrude(amount=CUT_EXTRUDE6_DEPTH, mode=Mode.SUBTRACT)

    # Sketch9 → Cut-Extrude7 (cut)
    with BuildSketch(Plane(origin=(0, 71, 0), x_dir=(1, 0, 0), z_dir=(0, 1, 0))):
        with Locations(Location((-47, 0, 0), (0, 0, 270))):
            Circle(SKETCH9_R)
        with Locations(Location((-47, 35, 0), (0, 0, 270))):
            Circle(SKETCH9_R)
        with Locations(Location((47, 0, 0), (0, 0, 270))):
            Circle(SKETCH9_R)
        with Locations(Location((47, 35, 0), (0, 0, 270))):
            Circle(SKETCH9_R)
    extrude(amount=-CUT_EXTRUDE7_DEPTH, mode=Mode.SUBTRACT)

    # Sketch10 → Cut-Extrude8 (cut, symmetric)
    with BuildSketch(Plane.XY):
        with Locations((-102.605195929, 8)):
            Circle(SKETCH10_R)
        with Locations((-102.605195929, 25)):
            Circle(SKETCH10_R)
        with Locations((102.605195929, 8)):
            Circle(SKETCH10_R)
        with Locations((102.605195929, 25)):
            Circle(SKETCH10_R)
    extrude(amount=CUT_EXTRUDE8_DEPTH, both=True, mode=Mode.SUBTRACT)

    # Sketch11 → Cut-Extrude9 (cut, symmetric)
    with BuildSketch(Plane(origin=(0, 0, 0), x_dir=(0, 0, -1), z_dir=(1, 0, 0))):
        with Locations((48.647181255, 21.673913043)):
            Circle(SKETCH11_R)
    extrude(amount=CUT_EXTRUDE9_DEPTH, both=True, mode=Mode.SUBTRACT)

    # Sketch12 → Cut-Extrude10 (cut, symmetric)
    with BuildSketch(Plane(origin=(0, 0, 0), x_dir=(0, 0, -1), z_dir=(1, 0, 0))):
        with Locations((17.5, 76)):
            Circle(SKETCH12_R)
    extrude(amount=CUT_EXTRUDE10_DEPTH, both=True, mode=Mode.SUBTRACT)


solid = part.part
